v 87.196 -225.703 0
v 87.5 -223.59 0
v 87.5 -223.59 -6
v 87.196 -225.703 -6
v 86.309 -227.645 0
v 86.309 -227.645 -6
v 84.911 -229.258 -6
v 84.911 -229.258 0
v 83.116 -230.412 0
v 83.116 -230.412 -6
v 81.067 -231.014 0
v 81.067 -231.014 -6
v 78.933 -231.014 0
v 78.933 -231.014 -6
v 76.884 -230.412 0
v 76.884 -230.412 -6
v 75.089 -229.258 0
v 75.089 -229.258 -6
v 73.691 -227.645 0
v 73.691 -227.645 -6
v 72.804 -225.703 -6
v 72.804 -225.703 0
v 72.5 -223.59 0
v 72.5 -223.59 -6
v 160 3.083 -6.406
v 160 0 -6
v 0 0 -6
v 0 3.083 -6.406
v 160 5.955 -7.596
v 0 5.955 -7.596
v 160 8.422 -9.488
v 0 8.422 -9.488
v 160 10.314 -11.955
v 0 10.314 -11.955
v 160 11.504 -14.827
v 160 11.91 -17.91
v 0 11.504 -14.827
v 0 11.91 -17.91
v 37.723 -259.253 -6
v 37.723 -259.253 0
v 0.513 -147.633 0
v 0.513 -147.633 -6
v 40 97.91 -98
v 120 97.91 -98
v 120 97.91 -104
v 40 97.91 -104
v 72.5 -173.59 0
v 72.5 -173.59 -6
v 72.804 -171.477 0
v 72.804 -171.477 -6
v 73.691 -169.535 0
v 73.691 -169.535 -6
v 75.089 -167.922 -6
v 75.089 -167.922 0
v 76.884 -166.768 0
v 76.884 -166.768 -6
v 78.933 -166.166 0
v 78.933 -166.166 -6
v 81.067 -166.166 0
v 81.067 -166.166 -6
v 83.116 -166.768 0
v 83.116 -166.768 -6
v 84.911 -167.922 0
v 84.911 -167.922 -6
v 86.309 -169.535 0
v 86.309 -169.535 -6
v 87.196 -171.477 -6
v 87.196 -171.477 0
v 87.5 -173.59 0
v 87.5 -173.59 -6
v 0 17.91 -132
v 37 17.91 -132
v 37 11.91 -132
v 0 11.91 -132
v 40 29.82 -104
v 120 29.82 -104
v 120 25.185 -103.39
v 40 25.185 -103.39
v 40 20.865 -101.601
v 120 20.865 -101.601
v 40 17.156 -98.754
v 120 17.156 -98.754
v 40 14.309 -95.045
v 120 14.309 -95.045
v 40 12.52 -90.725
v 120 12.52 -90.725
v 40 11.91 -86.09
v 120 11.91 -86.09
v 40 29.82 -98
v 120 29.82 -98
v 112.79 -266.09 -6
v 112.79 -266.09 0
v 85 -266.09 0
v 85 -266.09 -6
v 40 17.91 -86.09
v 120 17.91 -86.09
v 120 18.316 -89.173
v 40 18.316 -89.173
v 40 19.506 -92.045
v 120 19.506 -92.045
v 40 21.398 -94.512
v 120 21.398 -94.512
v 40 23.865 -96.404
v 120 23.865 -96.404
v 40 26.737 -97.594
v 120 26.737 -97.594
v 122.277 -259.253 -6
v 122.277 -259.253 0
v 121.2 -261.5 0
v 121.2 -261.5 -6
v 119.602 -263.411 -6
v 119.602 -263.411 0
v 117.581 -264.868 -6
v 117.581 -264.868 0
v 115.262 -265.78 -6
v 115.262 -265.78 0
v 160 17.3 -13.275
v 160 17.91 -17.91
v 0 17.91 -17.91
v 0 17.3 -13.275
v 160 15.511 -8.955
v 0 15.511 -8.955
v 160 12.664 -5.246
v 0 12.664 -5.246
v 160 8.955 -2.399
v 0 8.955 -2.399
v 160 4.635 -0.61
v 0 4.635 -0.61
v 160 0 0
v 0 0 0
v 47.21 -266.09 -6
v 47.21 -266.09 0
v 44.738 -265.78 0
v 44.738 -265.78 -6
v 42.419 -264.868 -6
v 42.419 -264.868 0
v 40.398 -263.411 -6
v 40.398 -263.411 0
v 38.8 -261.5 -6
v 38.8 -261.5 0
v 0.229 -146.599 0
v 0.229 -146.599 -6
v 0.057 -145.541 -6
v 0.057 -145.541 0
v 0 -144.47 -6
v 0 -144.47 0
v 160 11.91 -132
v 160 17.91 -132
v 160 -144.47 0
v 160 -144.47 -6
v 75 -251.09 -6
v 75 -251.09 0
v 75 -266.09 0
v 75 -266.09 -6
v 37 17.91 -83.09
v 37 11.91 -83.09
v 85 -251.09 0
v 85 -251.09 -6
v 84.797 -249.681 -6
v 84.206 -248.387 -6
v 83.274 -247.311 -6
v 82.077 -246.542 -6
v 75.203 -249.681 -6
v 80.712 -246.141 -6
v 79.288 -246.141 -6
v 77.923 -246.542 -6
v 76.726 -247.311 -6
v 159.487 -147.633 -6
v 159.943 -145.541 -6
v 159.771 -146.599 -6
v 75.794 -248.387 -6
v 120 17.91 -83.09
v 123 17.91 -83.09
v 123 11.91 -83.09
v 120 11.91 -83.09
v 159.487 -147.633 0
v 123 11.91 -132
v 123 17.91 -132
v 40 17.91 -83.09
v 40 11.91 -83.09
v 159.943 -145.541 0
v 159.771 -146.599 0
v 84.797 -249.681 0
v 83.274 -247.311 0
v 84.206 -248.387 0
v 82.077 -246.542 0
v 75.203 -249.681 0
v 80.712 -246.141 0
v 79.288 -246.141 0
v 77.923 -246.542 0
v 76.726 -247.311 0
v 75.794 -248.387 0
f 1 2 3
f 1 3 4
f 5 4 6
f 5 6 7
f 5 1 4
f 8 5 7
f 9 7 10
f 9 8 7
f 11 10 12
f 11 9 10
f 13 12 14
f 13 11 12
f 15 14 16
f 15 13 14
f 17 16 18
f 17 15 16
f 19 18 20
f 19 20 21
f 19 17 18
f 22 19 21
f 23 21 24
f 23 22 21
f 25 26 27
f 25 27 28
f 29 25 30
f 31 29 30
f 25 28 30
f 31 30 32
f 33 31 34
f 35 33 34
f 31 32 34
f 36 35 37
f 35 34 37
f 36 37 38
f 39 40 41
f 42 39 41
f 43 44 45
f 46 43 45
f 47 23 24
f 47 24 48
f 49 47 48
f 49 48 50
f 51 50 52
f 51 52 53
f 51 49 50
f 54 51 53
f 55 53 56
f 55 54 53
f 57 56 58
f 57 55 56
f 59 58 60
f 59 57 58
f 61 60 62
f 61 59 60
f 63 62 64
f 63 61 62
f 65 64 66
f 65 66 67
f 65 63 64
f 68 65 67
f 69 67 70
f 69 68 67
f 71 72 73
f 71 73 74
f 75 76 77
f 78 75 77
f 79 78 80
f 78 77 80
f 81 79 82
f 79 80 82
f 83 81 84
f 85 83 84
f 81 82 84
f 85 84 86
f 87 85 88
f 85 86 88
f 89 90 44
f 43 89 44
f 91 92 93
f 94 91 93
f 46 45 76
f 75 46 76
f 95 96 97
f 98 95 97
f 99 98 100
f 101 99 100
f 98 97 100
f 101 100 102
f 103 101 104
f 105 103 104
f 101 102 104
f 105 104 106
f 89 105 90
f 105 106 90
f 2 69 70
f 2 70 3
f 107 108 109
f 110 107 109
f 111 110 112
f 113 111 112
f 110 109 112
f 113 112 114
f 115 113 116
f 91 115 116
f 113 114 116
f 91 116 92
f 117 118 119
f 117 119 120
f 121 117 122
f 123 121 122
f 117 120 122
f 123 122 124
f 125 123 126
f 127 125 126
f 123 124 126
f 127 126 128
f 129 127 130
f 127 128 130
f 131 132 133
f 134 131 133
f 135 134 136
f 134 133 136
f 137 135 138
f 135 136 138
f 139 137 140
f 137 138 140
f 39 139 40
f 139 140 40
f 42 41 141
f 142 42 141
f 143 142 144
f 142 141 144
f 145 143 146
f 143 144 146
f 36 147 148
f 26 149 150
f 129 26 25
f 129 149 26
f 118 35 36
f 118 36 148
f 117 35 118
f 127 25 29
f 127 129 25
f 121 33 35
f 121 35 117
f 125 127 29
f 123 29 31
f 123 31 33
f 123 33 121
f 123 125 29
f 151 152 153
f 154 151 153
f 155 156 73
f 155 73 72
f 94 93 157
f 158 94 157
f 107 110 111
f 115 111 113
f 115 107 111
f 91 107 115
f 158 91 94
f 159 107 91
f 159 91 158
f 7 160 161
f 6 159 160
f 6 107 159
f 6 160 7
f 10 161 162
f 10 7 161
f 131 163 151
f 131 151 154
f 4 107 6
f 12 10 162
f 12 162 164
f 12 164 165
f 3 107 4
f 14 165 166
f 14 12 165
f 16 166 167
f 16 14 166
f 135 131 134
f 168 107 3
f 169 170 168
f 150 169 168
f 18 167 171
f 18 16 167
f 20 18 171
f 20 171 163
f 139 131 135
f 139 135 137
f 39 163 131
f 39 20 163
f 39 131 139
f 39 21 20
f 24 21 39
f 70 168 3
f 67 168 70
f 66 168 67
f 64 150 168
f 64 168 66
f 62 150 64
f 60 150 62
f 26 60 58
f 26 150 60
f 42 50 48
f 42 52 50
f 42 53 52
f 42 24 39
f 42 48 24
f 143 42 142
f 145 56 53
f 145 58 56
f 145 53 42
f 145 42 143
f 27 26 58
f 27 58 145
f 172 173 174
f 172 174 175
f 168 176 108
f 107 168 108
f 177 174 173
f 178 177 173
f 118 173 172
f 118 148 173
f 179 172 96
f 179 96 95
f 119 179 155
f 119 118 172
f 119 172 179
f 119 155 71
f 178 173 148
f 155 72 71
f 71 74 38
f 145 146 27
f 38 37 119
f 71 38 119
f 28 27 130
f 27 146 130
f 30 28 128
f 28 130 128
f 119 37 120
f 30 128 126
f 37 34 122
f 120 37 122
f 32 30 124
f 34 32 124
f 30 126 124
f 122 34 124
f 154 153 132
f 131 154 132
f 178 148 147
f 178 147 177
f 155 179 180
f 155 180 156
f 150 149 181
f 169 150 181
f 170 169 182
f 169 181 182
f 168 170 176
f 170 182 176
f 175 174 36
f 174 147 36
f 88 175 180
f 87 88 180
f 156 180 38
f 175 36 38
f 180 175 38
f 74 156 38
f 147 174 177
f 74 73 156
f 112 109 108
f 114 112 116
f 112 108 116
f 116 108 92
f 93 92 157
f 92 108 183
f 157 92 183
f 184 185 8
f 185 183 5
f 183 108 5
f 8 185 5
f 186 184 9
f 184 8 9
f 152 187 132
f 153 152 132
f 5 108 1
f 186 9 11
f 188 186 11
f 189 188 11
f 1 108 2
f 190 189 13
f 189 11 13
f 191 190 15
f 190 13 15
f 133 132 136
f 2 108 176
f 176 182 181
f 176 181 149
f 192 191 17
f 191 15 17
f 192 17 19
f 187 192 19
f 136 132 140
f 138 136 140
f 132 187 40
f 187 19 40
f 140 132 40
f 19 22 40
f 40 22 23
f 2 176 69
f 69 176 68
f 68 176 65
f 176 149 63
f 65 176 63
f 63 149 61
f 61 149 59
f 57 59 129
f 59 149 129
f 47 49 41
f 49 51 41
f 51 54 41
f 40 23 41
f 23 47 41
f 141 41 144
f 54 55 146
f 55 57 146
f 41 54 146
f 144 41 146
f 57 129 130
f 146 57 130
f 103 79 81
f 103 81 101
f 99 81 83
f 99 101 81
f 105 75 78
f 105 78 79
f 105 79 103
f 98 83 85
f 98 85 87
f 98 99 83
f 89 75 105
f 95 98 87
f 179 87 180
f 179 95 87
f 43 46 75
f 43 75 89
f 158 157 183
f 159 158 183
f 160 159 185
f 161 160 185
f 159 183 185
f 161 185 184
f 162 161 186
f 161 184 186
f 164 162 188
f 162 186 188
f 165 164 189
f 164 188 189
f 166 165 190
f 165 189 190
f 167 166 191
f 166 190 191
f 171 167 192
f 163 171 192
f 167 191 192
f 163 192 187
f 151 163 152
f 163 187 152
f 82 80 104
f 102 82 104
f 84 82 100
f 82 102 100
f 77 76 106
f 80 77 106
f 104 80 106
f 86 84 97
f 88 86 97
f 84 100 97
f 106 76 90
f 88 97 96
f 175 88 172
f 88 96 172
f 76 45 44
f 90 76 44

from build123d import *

# Parameters (mm, degrees)
BASE_FLANGE1_DEPTH  = 6
HEM2_DEPTH          = 160
SKETCH12_W          = 160
SKETCH12_H          = 6
BOSS_EXTRUDE2_DEPTH = 65.18
SKETCH13_W          = 37
SKETCH13_H          = 6
BOSS_EXTRUDE3_DEPTH = 48.91
SKETCH14_W          = 80
SKETCH14_H          = 6
BOSS_EXTRUDE4_DEPTH = 3
BOSS_EXTRUDE5_DEPTH = 80


# Read off the part's stored shape, not the designer's step: Hem2
# Sheet-metal steps are written as plain solids
with BuildPart() as part:
    # Sketch1 → Base-Flange1 (new body)
    with BuildSketch(Plane.XY):
        with BuildLine():
            Line((0, 0), (160, 0))
            Line((160, 0), (160, -144.47))
            ThreePointArc((160, -144.47), (159.87085305, -146.071955078), (159.486747986, -147.632532633))
            Line((159.486747986, -147.632532633), (122.276747986, -259.252532633))
            ThreePointArc((122.276747986, -259.252532633), (118.636993829, -264.202500426), (112.79, -266.09))
            Line((112.79, -266.09), (85, -266.09))
            Line((85, -266.09), (85, -251.09))
            ThreePointArc((85, -251.09), (80, -246.09), (75, -251.09))
            Line((75, -251.09), (75, -266.09))
            Line((75, -266.09), (47.21, -266.09))
            ThreePointArc((47.21, -266.09), (41.363006171, -264.202500426), (37.723252014, -259.252532633))
            Line((37.723252014, -259.252532633), (0.513252014, -147.632532633))
            ThreePointArc((0.513252014, -147.632532633), (0.12914695, -146.071955078), (0, -144.47))
            Line((0, -144.47), (0, 0))
        make_face()
        with BuildLine():
            Line((87.5, -173.59), (87.5, -223.59))
            ThreePointArc((87.5, -223.59), (80, -231.09), (72.5, -223.59))
            Line((72.5, -223.59), (72.5, -173.59))
            ThreePointArc((72.5, -173.59), (80, -166.09), (87.5, -173.59))
        make_face(mode=Mode.SUBTRACT)
    extrude(amount=-BASE_FLANGE1_DEPTH)

    # Hem2 outline → Hem2 (add)
    with BuildSketch(Plane.YZ):
        with BuildLine():
            Line((11.91, -17.91), (17.91, -17.91))
            ThreePointArc((17.91, -17.91), (12.664282451, -5.245717549), (0, 0))
            Line((0, 0), (0, -6))
            ThreePointArc((0, -6), (8.421641764, -9.488358236), (11.91, -17.91))
        make_face()
    extrude(amount=HEM2_DEPTH)

    # Sketch12 → Boss-Extrude2 (add)
    with BuildSketch(Plane(origin=(0, 0, -17.91), x_dir=(-1, 0, 0), z_dir=(0, 0, -1))):
        with Locations((-80, 14.91)):
            Rectangle(SKETCH12_W, SKETCH12_H)
    extrude(amount=BOSS_EXTRUDE2_DEPTH)

    # Sketch13 → Boss-Extrude3 (add)
    with BuildSketch(Plane(origin=(0, 0, -83.09), x_dir=(-1, 0, 0), z_dir=(0, 0, -1))):
        with Locations((-141.5, 14.91)):
            Rectangle(SKETCH13_W, SKETCH13_H)
        with Locations((-18.5, 14.91)):
            Rectangle(SKETCH13_W, SKETCH13_H)
    extrude(amount=BOSS_EXTRUDE3_DEPTH)

    # Sketch14 → Boss-Extrude4 (add)
    with BuildSketch(Plane(origin=(0, 0, -83.09), x_dir=(-1, 0, 0), z_dir=(0, 0, -1))):
        with Locations((-80, 14.91)):
            Rectangle(SKETCH14_W, SKETCH14_H)
    extrude(amount=BOSS_EXTRUDE4_DEPTH)

    # Sketch19 → Boss-Extrude5 (add)
    with BuildSketch(Plane(origin=(120, 0, 0), x_dir=(0, 0, -1), z_dir=(1, 0, 0))):
        with BuildLine():
            Line((98, 29.82), (98, 97.91))
            Line((98, 97.91), (104, 97.91))
            Line((104, 97.91), (104, 29.82))
            ThreePointArc((104, 29.82), (98.754282451, 17.155717549), (86.09, 11.91))
            Line((86.09, 11.91), (86.09, 17.91))
            ThreePointArc((86.09, 17.91), (94.511641764, 21.398358236), (98, 29.82))
        make_face()
    extrude(amount=-BOSS_EXTRUDE5_DEPTH)


solid = part.part
